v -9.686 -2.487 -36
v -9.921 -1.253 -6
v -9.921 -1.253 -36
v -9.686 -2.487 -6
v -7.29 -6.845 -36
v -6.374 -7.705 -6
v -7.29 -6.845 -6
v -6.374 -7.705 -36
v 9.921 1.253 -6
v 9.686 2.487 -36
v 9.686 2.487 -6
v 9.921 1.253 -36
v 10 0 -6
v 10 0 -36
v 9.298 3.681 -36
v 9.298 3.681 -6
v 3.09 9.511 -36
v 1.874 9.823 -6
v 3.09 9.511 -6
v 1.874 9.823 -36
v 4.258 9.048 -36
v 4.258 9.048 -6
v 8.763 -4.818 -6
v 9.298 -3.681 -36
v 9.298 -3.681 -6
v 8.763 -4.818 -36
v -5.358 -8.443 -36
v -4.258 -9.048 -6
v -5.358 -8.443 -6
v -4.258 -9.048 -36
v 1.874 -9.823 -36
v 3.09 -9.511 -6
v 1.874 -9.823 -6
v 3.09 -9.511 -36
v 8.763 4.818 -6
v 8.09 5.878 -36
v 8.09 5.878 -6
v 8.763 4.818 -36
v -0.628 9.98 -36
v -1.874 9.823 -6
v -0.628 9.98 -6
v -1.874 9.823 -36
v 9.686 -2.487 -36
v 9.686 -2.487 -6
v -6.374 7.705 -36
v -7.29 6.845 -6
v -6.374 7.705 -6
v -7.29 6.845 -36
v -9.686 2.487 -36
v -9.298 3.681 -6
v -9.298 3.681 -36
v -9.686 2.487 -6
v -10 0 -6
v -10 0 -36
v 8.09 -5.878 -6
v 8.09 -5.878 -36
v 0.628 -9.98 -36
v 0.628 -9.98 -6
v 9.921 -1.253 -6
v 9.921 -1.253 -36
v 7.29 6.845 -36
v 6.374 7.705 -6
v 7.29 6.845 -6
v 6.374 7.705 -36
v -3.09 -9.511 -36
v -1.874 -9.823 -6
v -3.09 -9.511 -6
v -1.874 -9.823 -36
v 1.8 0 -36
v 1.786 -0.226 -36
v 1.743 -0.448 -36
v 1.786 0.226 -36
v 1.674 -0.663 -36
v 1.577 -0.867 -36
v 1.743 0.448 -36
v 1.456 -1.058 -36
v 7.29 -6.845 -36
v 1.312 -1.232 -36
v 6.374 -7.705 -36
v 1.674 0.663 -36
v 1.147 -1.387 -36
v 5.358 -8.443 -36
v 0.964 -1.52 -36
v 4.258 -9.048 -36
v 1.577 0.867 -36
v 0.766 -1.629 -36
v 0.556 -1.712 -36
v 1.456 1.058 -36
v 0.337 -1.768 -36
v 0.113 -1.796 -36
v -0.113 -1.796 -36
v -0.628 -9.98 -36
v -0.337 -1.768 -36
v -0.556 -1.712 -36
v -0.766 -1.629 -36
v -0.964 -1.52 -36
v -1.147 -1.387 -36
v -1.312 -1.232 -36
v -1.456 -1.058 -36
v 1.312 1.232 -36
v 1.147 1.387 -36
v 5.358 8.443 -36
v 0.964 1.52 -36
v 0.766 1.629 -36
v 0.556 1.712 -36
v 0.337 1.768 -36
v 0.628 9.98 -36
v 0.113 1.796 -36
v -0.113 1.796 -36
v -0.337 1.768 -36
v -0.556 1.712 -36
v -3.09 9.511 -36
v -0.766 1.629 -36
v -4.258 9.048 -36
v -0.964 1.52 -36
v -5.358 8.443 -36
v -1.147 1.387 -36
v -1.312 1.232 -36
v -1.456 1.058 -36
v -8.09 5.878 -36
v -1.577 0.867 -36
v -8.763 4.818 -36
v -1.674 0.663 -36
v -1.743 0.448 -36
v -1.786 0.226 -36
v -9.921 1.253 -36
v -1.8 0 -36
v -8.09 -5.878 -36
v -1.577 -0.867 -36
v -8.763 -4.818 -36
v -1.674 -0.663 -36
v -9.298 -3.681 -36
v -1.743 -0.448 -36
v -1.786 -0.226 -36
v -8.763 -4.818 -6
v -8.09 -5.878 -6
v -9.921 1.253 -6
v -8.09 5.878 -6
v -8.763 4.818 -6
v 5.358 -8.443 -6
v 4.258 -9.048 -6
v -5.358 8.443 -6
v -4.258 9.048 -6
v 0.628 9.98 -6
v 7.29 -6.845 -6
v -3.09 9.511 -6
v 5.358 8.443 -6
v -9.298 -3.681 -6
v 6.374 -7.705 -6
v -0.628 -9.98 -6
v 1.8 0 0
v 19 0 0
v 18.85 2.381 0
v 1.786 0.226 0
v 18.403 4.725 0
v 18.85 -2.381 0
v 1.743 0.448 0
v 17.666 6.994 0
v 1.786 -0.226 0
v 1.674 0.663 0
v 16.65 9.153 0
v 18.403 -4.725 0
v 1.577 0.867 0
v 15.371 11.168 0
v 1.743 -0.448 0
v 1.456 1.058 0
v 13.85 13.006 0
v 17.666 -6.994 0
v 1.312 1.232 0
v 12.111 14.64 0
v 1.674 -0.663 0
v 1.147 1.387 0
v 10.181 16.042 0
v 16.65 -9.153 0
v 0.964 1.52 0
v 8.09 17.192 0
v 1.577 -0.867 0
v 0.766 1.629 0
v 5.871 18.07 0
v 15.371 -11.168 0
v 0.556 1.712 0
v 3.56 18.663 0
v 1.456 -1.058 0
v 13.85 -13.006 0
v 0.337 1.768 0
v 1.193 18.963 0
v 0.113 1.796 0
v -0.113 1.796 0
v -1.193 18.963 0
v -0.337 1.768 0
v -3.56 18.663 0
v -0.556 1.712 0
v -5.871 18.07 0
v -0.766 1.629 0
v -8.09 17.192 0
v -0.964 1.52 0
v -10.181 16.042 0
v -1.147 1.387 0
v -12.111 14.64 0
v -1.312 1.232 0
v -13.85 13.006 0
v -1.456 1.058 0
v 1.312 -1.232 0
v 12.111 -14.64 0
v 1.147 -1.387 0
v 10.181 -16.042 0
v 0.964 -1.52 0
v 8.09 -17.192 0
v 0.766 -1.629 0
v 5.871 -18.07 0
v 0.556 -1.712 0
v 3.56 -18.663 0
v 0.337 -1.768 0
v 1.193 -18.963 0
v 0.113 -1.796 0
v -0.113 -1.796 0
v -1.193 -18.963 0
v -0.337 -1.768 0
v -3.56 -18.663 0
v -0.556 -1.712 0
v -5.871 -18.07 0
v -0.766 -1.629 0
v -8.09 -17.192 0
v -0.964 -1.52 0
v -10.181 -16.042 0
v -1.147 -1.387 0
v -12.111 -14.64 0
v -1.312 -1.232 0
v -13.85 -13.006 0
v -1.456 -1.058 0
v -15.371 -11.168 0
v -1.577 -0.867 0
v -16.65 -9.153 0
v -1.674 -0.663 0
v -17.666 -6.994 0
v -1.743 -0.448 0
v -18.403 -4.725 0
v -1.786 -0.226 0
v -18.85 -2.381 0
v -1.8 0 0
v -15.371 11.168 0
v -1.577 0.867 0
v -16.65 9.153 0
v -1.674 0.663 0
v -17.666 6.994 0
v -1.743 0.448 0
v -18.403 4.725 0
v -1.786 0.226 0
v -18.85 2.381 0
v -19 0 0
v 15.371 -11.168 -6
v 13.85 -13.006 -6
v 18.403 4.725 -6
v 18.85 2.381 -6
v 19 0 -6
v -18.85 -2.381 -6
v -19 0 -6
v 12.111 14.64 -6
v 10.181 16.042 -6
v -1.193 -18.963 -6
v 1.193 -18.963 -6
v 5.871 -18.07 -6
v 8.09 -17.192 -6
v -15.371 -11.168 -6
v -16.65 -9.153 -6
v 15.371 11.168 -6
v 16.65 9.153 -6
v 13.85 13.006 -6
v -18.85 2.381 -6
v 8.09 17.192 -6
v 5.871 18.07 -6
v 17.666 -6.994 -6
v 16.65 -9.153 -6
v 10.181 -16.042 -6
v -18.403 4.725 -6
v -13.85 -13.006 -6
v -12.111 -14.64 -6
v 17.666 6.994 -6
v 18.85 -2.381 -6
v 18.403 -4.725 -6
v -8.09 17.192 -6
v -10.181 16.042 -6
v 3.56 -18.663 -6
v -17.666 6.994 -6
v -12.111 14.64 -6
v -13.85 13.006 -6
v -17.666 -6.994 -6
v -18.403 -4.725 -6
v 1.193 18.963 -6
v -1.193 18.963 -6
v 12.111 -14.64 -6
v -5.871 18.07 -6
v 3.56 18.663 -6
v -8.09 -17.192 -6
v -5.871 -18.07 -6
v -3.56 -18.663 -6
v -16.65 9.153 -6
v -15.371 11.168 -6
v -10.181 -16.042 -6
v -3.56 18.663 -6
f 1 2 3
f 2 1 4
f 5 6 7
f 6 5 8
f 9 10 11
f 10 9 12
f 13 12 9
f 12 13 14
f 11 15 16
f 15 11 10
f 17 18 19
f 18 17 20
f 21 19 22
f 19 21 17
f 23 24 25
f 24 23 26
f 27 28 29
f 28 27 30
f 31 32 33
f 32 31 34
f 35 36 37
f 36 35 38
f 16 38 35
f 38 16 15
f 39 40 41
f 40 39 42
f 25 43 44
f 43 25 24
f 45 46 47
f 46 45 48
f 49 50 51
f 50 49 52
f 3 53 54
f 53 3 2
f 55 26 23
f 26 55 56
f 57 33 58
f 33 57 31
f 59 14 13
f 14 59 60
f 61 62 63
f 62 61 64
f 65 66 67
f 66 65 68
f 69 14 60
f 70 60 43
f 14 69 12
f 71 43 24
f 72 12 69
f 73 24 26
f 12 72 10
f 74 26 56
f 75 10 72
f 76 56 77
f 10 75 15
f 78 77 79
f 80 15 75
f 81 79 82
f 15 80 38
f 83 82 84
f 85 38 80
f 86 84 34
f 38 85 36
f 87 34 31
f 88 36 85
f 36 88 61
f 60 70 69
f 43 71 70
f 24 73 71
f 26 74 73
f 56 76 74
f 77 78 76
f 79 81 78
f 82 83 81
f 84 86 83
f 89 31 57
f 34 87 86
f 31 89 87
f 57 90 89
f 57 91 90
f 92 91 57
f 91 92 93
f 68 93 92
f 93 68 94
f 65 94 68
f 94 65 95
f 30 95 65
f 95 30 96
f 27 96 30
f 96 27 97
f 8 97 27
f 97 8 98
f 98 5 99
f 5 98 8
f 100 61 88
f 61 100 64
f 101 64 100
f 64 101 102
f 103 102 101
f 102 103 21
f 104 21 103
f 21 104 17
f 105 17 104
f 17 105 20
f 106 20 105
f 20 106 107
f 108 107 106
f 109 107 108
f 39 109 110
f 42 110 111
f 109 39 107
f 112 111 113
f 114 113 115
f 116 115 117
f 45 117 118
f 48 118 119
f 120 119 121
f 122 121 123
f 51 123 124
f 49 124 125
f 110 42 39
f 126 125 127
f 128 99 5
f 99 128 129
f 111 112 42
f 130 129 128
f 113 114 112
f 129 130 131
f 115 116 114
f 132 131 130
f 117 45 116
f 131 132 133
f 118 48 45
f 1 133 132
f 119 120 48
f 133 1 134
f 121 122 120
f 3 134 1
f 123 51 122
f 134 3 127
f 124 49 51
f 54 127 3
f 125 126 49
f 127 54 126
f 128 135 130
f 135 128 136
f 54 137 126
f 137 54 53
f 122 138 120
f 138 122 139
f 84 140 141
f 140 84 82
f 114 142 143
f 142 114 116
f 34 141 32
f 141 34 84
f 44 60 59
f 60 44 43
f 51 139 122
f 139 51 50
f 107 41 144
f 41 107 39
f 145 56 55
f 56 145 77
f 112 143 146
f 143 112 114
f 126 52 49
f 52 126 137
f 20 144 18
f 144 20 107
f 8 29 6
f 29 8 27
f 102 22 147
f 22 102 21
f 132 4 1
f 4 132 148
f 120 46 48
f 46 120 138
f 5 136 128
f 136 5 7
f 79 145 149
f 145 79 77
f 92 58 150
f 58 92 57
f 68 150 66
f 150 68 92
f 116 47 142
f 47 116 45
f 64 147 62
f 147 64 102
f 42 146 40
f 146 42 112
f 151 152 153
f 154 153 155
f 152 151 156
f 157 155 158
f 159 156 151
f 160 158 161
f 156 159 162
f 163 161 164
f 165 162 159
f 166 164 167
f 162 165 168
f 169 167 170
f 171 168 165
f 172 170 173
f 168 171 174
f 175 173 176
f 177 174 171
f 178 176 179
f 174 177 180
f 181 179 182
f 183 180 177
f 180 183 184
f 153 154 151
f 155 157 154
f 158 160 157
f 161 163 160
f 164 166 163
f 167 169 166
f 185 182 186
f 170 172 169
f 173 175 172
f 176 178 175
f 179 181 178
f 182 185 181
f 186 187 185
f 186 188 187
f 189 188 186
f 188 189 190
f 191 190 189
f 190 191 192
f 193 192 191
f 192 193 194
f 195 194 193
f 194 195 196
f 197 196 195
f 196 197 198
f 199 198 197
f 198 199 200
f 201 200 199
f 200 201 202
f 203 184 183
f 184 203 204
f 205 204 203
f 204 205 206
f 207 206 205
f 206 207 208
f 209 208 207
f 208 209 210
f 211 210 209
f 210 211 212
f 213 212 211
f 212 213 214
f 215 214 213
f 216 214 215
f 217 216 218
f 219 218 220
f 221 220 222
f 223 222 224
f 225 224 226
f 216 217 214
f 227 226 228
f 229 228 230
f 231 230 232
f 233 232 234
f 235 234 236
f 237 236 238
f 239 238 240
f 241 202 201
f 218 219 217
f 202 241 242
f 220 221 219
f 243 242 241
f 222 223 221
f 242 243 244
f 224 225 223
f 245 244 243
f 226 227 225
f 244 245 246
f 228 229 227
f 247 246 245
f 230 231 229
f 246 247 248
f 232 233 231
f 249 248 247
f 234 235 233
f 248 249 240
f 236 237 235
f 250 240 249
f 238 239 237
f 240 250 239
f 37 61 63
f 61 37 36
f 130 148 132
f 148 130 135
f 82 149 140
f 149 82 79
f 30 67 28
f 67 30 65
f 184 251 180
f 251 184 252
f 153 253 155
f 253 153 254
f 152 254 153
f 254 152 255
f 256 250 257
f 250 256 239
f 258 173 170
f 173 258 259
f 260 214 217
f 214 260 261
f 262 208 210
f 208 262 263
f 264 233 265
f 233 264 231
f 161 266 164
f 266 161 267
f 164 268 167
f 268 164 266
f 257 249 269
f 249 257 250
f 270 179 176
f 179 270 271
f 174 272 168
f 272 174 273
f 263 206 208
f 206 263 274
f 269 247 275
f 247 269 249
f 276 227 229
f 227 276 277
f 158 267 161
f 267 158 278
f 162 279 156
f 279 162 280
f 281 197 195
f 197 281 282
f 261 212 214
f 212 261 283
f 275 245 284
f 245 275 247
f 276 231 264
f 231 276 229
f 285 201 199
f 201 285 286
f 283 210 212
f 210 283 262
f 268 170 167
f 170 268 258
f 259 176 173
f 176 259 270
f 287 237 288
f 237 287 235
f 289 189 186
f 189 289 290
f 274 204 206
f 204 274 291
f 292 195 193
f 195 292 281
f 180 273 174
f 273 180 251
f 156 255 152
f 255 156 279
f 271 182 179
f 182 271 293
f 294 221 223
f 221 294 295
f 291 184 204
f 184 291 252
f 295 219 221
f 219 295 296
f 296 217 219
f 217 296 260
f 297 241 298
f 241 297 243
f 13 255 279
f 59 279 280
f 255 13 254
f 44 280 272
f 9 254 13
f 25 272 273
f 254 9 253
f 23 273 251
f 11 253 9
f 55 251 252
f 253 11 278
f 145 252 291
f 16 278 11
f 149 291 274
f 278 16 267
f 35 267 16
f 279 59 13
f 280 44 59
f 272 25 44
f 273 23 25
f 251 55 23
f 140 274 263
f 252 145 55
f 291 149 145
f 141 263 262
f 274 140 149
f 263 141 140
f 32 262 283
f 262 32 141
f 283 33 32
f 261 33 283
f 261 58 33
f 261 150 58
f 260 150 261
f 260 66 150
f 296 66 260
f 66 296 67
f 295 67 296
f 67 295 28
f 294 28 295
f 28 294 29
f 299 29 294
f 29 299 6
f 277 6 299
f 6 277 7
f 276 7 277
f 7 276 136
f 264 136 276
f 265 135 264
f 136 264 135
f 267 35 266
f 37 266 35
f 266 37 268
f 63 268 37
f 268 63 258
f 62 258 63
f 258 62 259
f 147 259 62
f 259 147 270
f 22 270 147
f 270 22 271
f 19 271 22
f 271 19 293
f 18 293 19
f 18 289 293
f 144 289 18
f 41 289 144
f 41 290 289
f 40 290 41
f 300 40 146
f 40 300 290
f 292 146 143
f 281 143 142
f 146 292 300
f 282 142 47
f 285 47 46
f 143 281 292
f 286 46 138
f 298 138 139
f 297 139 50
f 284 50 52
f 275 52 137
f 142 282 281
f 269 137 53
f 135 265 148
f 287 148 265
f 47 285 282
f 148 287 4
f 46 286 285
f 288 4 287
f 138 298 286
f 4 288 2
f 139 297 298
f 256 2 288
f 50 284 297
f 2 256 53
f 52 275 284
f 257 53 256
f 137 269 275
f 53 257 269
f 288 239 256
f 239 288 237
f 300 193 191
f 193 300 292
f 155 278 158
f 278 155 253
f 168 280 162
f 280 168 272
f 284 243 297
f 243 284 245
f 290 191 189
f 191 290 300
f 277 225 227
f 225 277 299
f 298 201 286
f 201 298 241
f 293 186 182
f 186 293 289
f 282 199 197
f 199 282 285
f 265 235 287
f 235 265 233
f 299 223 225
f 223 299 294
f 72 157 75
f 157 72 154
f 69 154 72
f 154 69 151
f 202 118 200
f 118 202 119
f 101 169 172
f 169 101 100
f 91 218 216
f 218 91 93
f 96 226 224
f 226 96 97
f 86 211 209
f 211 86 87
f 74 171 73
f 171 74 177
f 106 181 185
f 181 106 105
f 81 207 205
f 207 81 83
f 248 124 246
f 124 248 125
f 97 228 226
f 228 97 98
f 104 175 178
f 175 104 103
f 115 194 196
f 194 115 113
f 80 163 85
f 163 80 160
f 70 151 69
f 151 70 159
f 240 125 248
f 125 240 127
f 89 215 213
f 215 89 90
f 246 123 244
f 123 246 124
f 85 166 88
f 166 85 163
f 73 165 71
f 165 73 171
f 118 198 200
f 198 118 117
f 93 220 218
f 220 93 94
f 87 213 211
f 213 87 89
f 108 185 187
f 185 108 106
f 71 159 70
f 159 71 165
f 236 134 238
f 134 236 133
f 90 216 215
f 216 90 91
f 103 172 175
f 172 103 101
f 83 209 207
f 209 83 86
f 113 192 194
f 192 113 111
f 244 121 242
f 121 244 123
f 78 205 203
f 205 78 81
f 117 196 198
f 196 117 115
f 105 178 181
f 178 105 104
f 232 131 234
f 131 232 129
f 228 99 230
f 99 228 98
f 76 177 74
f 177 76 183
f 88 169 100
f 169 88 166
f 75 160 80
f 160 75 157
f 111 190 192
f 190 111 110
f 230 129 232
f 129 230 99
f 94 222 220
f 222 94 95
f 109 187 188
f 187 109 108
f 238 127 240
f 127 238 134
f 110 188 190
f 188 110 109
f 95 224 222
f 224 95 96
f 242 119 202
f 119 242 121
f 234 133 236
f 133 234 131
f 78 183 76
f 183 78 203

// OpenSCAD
$fn = 50;


difference() {
	union() {
		translate(v = [0, 0, -36.0000000000]) {
			cylinder(h = 36, r = 10.0000000000);
		}
		translate(v = [0, 0, -6.0000000000]) {
			cylinder(h = 6, r = 19.0000000000);
		}
	}
	union() {
		#translate(v = [0, 0, -36]) {
			cylinder(h = 36, r = 1.8000000000);
		}
	}
}
